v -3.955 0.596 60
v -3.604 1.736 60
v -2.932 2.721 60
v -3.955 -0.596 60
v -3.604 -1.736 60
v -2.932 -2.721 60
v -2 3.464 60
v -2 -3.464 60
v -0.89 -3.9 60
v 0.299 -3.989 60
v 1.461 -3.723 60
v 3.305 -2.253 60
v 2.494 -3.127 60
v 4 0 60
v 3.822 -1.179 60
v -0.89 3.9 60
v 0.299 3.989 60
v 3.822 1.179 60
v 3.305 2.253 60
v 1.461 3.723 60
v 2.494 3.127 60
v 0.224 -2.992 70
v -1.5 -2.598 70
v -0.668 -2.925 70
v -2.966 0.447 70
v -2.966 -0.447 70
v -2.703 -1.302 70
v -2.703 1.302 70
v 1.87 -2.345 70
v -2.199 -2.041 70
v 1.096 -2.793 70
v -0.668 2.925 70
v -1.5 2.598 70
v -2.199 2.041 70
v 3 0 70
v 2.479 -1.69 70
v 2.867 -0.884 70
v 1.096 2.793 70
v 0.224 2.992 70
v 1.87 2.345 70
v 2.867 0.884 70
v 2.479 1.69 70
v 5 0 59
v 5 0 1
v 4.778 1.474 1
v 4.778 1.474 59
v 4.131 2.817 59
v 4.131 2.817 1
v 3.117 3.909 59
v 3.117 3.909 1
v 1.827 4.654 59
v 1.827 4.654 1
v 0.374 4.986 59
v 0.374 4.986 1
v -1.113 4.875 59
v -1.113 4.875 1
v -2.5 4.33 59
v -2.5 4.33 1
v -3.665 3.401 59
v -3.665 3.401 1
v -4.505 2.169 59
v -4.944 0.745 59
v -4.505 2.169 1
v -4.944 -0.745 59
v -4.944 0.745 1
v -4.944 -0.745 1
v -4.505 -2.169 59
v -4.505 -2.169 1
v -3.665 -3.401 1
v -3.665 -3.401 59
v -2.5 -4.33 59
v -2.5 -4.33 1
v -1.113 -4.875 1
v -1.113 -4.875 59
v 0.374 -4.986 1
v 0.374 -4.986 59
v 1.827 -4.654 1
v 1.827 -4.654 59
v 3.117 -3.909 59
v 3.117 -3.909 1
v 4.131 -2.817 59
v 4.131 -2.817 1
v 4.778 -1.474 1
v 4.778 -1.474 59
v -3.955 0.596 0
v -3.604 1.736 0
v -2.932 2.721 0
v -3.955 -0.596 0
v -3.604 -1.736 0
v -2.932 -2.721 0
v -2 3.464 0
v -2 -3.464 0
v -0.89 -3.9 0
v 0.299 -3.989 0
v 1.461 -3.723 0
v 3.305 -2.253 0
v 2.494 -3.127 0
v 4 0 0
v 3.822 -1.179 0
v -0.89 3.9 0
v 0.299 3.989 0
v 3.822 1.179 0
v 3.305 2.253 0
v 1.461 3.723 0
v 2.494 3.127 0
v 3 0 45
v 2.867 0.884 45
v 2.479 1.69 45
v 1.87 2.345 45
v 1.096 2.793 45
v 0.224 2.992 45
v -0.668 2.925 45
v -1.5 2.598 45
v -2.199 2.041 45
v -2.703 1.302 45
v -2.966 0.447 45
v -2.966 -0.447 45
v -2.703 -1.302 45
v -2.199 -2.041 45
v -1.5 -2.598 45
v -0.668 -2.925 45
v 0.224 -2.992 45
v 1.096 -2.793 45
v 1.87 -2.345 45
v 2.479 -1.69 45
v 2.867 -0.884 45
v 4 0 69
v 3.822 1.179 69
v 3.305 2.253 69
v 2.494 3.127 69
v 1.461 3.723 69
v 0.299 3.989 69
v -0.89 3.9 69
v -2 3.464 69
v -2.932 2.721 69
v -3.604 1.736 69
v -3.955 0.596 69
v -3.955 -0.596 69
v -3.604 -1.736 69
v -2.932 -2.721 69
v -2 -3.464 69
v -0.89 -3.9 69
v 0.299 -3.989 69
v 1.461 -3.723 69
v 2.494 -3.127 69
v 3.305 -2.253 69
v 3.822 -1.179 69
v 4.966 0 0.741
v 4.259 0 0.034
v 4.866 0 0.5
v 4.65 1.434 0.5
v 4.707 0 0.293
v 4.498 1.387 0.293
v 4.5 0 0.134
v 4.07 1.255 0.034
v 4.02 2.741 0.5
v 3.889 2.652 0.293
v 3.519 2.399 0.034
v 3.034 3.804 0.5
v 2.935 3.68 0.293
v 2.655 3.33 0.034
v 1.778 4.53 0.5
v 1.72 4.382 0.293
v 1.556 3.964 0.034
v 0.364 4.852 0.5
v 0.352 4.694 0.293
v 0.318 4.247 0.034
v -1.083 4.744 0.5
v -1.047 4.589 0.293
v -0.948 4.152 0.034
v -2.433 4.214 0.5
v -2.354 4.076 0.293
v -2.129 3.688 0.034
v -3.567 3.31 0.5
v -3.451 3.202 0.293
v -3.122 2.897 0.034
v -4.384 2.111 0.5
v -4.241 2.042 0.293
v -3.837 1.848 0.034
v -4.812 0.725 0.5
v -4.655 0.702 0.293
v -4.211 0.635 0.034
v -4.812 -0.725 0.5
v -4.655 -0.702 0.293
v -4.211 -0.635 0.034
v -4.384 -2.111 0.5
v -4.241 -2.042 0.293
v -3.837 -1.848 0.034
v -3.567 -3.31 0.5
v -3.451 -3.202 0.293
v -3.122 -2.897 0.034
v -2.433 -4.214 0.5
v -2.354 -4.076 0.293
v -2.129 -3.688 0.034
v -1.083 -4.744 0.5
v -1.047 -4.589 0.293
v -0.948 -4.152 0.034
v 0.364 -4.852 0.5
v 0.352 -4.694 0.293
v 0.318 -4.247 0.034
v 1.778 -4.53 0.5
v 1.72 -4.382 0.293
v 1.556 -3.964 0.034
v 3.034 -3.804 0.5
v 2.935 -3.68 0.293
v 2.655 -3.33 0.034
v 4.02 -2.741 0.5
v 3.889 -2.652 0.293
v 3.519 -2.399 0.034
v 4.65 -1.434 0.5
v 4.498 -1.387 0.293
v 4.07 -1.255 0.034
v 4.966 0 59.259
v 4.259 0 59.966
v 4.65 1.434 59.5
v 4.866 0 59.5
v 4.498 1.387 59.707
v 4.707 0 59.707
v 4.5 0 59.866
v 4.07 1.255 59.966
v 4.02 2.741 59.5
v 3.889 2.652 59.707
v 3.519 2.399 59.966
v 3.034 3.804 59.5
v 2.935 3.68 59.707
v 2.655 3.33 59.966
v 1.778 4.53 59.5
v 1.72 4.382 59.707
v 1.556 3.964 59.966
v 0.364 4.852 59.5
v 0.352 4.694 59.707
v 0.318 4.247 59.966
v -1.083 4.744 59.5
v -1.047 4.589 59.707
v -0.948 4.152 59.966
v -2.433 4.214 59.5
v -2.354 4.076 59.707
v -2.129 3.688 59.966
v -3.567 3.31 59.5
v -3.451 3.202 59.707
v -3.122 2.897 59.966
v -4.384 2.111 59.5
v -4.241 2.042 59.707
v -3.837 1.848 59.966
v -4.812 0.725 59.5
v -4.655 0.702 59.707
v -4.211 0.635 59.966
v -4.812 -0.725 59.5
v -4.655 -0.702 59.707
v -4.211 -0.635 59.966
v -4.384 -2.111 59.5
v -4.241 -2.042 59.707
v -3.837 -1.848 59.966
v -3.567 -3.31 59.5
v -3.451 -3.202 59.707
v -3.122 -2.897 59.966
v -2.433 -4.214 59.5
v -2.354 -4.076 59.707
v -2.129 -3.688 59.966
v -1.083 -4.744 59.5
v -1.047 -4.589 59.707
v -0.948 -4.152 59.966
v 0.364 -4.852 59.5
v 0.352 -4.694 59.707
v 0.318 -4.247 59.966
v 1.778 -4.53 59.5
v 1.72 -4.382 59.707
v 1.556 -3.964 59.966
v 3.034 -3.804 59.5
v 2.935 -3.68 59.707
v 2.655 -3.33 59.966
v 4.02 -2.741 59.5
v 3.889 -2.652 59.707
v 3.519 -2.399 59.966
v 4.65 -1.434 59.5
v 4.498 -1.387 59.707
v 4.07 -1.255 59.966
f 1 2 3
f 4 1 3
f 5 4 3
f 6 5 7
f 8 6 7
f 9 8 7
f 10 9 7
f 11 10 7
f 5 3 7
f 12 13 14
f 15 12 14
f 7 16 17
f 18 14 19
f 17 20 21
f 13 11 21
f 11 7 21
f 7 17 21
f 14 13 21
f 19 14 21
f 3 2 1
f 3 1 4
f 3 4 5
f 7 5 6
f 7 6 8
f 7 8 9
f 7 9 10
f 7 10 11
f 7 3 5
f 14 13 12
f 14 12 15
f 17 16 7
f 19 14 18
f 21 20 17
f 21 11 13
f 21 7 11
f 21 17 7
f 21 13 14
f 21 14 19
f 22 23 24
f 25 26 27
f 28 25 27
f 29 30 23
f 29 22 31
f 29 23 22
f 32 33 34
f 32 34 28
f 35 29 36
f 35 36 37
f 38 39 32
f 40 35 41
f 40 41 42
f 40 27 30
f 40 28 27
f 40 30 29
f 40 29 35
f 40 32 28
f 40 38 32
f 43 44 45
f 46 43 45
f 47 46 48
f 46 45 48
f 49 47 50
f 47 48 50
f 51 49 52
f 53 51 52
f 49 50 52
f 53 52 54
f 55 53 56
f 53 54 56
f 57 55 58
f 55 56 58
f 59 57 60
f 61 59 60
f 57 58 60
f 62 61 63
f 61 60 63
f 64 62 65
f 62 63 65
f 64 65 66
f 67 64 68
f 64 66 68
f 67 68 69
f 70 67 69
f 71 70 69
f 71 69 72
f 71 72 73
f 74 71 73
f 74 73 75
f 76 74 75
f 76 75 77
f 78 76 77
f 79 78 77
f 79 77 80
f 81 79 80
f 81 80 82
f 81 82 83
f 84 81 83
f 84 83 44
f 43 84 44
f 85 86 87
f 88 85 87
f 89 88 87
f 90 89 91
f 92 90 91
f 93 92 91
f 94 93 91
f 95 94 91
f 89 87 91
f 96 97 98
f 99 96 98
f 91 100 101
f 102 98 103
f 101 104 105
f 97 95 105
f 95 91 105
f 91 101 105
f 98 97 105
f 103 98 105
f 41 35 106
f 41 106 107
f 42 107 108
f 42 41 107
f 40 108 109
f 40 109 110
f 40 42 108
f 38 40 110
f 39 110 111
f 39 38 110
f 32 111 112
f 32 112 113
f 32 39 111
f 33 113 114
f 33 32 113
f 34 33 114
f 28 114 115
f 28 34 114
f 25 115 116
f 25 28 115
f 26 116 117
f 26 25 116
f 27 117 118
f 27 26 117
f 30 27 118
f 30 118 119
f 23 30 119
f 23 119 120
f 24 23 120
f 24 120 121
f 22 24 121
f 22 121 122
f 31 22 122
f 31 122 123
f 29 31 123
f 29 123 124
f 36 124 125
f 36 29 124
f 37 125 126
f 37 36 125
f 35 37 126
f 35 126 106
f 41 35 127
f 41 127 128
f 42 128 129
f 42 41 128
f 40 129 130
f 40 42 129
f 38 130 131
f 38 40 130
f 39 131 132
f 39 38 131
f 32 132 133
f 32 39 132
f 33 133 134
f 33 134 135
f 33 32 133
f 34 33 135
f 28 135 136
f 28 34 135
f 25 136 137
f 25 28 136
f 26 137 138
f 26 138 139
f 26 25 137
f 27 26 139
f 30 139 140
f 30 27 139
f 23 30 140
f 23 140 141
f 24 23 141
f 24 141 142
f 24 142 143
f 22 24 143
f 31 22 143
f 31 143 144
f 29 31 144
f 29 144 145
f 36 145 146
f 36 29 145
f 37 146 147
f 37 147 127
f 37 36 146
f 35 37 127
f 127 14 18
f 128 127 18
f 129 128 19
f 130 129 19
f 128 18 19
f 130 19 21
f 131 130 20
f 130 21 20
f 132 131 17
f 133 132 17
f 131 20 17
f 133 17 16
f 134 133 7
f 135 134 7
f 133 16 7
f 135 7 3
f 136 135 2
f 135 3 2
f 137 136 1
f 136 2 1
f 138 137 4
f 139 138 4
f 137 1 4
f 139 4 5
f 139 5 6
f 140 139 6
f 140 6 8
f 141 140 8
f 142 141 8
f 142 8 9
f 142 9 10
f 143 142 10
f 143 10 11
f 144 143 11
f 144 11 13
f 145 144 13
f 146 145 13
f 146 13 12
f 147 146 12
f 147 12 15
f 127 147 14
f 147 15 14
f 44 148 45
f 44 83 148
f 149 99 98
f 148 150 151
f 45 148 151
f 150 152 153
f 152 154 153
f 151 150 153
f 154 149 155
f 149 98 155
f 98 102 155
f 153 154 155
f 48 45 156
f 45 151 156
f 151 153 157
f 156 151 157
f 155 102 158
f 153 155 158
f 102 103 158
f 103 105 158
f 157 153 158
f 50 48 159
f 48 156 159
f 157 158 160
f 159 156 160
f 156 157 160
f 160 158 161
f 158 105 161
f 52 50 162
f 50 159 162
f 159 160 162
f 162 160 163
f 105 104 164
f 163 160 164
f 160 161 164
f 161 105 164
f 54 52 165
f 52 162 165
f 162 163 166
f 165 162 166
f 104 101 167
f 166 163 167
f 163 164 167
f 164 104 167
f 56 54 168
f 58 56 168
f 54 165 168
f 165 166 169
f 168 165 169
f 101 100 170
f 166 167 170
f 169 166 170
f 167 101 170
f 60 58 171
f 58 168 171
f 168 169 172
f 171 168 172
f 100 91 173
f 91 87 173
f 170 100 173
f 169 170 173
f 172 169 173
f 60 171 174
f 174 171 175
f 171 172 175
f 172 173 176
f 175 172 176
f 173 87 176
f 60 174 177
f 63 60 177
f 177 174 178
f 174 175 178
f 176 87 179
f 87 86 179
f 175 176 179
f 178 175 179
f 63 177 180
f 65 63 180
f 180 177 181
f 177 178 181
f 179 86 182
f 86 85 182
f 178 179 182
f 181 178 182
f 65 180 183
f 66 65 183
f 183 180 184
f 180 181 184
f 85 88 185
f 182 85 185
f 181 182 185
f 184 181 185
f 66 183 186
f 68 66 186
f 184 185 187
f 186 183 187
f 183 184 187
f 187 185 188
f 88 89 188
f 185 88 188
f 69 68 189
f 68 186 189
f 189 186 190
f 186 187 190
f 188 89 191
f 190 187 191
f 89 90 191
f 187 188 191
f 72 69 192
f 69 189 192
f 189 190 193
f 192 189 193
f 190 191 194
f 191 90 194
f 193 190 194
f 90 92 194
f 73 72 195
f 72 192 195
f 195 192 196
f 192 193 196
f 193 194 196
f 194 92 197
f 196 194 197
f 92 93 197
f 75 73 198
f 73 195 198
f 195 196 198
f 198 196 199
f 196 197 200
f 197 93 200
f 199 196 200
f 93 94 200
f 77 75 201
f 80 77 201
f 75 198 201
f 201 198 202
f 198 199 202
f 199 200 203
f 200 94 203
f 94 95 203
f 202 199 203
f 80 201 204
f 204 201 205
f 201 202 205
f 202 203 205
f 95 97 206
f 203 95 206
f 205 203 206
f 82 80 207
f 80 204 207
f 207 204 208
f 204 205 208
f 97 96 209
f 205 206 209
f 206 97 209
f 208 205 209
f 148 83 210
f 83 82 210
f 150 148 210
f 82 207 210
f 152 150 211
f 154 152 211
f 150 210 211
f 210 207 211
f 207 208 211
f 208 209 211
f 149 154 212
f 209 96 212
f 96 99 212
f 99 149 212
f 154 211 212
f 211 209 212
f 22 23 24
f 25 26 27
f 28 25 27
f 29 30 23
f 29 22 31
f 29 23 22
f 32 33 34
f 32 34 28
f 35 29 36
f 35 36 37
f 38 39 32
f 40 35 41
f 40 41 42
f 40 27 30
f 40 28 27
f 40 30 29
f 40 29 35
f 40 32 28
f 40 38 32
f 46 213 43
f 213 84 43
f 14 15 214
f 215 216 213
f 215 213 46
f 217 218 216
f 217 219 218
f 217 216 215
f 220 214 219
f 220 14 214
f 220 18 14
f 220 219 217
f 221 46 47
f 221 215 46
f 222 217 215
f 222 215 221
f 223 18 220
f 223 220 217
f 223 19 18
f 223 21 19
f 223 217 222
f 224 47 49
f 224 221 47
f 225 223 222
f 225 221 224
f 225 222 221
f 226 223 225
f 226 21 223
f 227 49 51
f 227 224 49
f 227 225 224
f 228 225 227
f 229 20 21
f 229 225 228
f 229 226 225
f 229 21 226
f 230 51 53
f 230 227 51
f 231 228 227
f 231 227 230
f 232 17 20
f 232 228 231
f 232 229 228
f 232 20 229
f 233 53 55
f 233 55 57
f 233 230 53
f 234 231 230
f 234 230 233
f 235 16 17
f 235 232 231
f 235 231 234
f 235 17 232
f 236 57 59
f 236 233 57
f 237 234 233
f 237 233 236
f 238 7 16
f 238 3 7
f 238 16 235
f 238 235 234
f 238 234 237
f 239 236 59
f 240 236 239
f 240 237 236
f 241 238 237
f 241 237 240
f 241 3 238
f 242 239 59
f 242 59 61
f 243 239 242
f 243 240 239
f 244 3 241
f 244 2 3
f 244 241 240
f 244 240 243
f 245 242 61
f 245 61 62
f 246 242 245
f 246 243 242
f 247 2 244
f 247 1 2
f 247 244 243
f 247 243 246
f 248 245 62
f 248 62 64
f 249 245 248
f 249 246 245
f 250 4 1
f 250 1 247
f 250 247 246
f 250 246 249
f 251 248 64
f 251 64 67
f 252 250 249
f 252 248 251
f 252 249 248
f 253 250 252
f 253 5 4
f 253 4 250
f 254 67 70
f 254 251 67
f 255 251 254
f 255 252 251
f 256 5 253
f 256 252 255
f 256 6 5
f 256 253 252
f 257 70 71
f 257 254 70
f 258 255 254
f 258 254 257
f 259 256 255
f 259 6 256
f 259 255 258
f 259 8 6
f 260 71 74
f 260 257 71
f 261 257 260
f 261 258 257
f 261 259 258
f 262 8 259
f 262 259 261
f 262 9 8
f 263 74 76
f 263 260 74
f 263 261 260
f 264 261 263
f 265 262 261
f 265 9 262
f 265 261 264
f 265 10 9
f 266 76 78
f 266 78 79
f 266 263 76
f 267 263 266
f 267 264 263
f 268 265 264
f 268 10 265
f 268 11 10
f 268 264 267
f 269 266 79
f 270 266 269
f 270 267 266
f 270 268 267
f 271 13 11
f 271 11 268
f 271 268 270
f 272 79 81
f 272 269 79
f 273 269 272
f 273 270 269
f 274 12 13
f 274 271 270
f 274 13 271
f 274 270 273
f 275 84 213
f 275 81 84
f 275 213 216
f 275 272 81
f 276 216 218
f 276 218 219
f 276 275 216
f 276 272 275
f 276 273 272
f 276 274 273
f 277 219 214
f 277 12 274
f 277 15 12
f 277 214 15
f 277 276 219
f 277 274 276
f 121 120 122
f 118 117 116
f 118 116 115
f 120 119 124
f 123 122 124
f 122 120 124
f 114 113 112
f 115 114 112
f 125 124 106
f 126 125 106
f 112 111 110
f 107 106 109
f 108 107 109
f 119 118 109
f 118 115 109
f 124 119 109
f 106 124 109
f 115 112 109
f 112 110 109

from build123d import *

# Parameters (mm, degrees)
F0_R     = 5
F1_DEPTH = 50
F2_R     = 1
F3_DEPTH = 10
F4_R     = 1
F5_R     = 4
F6_DEPTH = 10
F7_SIZE  = 1
F8_DEPTH = 25


with BuildPart() as f1:
    # F0 (on Top) → F1 (new body)
    with BuildSketch(Plane.XY):
        Circle(F0_R)
    extrude(amount=F1_DEPTH)

    # F2
    f2_edges = [f1.edges().sort_by_distance(p)[0] for p in [
        (-5, 0, 0),
    ]]
    fillet(f2_edges, radius=F2_R)

    # F3 (add): a face of the model
    f3_faces = [f1.faces().sort_by_distance(p)[0] for p in [
        (0, 0, 50),
    ]]
    extrude(f3_faces, amount=F3_DEPTH)

    # F4
    f4_edges = [f1.edges().sort_by_distance(p)[0] for p in [
        (-5, 0, 60),
    ]]
    fillet(f4_edges, radius=F4_R)


with BuildPart() as f6:
    # F5 (on face) → F6 (new body)
    with BuildSketch(Plane.XY.offset(60)):
        Circle(F5_R)
    extrude(amount=F6_DEPTH)

    # F7
    f7_edges = [f6.edges().sort_by_distance(p)[0] for p in [
        (-4, 0, 70),
    ]]
    chamfer(f7_edges, length=F7_SIZE)


with BuildPart() as f8:
    # F8 (new): a face of the model
    f8_faces = [f6.part.faces().sort_by_distance(p)[0] for p in [
        (0, 0, 70),
    ]]
    extrude(f8_faces, amount=-F8_DEPTH)


solid = Compound([f1.part, f6.part, f8.part])
